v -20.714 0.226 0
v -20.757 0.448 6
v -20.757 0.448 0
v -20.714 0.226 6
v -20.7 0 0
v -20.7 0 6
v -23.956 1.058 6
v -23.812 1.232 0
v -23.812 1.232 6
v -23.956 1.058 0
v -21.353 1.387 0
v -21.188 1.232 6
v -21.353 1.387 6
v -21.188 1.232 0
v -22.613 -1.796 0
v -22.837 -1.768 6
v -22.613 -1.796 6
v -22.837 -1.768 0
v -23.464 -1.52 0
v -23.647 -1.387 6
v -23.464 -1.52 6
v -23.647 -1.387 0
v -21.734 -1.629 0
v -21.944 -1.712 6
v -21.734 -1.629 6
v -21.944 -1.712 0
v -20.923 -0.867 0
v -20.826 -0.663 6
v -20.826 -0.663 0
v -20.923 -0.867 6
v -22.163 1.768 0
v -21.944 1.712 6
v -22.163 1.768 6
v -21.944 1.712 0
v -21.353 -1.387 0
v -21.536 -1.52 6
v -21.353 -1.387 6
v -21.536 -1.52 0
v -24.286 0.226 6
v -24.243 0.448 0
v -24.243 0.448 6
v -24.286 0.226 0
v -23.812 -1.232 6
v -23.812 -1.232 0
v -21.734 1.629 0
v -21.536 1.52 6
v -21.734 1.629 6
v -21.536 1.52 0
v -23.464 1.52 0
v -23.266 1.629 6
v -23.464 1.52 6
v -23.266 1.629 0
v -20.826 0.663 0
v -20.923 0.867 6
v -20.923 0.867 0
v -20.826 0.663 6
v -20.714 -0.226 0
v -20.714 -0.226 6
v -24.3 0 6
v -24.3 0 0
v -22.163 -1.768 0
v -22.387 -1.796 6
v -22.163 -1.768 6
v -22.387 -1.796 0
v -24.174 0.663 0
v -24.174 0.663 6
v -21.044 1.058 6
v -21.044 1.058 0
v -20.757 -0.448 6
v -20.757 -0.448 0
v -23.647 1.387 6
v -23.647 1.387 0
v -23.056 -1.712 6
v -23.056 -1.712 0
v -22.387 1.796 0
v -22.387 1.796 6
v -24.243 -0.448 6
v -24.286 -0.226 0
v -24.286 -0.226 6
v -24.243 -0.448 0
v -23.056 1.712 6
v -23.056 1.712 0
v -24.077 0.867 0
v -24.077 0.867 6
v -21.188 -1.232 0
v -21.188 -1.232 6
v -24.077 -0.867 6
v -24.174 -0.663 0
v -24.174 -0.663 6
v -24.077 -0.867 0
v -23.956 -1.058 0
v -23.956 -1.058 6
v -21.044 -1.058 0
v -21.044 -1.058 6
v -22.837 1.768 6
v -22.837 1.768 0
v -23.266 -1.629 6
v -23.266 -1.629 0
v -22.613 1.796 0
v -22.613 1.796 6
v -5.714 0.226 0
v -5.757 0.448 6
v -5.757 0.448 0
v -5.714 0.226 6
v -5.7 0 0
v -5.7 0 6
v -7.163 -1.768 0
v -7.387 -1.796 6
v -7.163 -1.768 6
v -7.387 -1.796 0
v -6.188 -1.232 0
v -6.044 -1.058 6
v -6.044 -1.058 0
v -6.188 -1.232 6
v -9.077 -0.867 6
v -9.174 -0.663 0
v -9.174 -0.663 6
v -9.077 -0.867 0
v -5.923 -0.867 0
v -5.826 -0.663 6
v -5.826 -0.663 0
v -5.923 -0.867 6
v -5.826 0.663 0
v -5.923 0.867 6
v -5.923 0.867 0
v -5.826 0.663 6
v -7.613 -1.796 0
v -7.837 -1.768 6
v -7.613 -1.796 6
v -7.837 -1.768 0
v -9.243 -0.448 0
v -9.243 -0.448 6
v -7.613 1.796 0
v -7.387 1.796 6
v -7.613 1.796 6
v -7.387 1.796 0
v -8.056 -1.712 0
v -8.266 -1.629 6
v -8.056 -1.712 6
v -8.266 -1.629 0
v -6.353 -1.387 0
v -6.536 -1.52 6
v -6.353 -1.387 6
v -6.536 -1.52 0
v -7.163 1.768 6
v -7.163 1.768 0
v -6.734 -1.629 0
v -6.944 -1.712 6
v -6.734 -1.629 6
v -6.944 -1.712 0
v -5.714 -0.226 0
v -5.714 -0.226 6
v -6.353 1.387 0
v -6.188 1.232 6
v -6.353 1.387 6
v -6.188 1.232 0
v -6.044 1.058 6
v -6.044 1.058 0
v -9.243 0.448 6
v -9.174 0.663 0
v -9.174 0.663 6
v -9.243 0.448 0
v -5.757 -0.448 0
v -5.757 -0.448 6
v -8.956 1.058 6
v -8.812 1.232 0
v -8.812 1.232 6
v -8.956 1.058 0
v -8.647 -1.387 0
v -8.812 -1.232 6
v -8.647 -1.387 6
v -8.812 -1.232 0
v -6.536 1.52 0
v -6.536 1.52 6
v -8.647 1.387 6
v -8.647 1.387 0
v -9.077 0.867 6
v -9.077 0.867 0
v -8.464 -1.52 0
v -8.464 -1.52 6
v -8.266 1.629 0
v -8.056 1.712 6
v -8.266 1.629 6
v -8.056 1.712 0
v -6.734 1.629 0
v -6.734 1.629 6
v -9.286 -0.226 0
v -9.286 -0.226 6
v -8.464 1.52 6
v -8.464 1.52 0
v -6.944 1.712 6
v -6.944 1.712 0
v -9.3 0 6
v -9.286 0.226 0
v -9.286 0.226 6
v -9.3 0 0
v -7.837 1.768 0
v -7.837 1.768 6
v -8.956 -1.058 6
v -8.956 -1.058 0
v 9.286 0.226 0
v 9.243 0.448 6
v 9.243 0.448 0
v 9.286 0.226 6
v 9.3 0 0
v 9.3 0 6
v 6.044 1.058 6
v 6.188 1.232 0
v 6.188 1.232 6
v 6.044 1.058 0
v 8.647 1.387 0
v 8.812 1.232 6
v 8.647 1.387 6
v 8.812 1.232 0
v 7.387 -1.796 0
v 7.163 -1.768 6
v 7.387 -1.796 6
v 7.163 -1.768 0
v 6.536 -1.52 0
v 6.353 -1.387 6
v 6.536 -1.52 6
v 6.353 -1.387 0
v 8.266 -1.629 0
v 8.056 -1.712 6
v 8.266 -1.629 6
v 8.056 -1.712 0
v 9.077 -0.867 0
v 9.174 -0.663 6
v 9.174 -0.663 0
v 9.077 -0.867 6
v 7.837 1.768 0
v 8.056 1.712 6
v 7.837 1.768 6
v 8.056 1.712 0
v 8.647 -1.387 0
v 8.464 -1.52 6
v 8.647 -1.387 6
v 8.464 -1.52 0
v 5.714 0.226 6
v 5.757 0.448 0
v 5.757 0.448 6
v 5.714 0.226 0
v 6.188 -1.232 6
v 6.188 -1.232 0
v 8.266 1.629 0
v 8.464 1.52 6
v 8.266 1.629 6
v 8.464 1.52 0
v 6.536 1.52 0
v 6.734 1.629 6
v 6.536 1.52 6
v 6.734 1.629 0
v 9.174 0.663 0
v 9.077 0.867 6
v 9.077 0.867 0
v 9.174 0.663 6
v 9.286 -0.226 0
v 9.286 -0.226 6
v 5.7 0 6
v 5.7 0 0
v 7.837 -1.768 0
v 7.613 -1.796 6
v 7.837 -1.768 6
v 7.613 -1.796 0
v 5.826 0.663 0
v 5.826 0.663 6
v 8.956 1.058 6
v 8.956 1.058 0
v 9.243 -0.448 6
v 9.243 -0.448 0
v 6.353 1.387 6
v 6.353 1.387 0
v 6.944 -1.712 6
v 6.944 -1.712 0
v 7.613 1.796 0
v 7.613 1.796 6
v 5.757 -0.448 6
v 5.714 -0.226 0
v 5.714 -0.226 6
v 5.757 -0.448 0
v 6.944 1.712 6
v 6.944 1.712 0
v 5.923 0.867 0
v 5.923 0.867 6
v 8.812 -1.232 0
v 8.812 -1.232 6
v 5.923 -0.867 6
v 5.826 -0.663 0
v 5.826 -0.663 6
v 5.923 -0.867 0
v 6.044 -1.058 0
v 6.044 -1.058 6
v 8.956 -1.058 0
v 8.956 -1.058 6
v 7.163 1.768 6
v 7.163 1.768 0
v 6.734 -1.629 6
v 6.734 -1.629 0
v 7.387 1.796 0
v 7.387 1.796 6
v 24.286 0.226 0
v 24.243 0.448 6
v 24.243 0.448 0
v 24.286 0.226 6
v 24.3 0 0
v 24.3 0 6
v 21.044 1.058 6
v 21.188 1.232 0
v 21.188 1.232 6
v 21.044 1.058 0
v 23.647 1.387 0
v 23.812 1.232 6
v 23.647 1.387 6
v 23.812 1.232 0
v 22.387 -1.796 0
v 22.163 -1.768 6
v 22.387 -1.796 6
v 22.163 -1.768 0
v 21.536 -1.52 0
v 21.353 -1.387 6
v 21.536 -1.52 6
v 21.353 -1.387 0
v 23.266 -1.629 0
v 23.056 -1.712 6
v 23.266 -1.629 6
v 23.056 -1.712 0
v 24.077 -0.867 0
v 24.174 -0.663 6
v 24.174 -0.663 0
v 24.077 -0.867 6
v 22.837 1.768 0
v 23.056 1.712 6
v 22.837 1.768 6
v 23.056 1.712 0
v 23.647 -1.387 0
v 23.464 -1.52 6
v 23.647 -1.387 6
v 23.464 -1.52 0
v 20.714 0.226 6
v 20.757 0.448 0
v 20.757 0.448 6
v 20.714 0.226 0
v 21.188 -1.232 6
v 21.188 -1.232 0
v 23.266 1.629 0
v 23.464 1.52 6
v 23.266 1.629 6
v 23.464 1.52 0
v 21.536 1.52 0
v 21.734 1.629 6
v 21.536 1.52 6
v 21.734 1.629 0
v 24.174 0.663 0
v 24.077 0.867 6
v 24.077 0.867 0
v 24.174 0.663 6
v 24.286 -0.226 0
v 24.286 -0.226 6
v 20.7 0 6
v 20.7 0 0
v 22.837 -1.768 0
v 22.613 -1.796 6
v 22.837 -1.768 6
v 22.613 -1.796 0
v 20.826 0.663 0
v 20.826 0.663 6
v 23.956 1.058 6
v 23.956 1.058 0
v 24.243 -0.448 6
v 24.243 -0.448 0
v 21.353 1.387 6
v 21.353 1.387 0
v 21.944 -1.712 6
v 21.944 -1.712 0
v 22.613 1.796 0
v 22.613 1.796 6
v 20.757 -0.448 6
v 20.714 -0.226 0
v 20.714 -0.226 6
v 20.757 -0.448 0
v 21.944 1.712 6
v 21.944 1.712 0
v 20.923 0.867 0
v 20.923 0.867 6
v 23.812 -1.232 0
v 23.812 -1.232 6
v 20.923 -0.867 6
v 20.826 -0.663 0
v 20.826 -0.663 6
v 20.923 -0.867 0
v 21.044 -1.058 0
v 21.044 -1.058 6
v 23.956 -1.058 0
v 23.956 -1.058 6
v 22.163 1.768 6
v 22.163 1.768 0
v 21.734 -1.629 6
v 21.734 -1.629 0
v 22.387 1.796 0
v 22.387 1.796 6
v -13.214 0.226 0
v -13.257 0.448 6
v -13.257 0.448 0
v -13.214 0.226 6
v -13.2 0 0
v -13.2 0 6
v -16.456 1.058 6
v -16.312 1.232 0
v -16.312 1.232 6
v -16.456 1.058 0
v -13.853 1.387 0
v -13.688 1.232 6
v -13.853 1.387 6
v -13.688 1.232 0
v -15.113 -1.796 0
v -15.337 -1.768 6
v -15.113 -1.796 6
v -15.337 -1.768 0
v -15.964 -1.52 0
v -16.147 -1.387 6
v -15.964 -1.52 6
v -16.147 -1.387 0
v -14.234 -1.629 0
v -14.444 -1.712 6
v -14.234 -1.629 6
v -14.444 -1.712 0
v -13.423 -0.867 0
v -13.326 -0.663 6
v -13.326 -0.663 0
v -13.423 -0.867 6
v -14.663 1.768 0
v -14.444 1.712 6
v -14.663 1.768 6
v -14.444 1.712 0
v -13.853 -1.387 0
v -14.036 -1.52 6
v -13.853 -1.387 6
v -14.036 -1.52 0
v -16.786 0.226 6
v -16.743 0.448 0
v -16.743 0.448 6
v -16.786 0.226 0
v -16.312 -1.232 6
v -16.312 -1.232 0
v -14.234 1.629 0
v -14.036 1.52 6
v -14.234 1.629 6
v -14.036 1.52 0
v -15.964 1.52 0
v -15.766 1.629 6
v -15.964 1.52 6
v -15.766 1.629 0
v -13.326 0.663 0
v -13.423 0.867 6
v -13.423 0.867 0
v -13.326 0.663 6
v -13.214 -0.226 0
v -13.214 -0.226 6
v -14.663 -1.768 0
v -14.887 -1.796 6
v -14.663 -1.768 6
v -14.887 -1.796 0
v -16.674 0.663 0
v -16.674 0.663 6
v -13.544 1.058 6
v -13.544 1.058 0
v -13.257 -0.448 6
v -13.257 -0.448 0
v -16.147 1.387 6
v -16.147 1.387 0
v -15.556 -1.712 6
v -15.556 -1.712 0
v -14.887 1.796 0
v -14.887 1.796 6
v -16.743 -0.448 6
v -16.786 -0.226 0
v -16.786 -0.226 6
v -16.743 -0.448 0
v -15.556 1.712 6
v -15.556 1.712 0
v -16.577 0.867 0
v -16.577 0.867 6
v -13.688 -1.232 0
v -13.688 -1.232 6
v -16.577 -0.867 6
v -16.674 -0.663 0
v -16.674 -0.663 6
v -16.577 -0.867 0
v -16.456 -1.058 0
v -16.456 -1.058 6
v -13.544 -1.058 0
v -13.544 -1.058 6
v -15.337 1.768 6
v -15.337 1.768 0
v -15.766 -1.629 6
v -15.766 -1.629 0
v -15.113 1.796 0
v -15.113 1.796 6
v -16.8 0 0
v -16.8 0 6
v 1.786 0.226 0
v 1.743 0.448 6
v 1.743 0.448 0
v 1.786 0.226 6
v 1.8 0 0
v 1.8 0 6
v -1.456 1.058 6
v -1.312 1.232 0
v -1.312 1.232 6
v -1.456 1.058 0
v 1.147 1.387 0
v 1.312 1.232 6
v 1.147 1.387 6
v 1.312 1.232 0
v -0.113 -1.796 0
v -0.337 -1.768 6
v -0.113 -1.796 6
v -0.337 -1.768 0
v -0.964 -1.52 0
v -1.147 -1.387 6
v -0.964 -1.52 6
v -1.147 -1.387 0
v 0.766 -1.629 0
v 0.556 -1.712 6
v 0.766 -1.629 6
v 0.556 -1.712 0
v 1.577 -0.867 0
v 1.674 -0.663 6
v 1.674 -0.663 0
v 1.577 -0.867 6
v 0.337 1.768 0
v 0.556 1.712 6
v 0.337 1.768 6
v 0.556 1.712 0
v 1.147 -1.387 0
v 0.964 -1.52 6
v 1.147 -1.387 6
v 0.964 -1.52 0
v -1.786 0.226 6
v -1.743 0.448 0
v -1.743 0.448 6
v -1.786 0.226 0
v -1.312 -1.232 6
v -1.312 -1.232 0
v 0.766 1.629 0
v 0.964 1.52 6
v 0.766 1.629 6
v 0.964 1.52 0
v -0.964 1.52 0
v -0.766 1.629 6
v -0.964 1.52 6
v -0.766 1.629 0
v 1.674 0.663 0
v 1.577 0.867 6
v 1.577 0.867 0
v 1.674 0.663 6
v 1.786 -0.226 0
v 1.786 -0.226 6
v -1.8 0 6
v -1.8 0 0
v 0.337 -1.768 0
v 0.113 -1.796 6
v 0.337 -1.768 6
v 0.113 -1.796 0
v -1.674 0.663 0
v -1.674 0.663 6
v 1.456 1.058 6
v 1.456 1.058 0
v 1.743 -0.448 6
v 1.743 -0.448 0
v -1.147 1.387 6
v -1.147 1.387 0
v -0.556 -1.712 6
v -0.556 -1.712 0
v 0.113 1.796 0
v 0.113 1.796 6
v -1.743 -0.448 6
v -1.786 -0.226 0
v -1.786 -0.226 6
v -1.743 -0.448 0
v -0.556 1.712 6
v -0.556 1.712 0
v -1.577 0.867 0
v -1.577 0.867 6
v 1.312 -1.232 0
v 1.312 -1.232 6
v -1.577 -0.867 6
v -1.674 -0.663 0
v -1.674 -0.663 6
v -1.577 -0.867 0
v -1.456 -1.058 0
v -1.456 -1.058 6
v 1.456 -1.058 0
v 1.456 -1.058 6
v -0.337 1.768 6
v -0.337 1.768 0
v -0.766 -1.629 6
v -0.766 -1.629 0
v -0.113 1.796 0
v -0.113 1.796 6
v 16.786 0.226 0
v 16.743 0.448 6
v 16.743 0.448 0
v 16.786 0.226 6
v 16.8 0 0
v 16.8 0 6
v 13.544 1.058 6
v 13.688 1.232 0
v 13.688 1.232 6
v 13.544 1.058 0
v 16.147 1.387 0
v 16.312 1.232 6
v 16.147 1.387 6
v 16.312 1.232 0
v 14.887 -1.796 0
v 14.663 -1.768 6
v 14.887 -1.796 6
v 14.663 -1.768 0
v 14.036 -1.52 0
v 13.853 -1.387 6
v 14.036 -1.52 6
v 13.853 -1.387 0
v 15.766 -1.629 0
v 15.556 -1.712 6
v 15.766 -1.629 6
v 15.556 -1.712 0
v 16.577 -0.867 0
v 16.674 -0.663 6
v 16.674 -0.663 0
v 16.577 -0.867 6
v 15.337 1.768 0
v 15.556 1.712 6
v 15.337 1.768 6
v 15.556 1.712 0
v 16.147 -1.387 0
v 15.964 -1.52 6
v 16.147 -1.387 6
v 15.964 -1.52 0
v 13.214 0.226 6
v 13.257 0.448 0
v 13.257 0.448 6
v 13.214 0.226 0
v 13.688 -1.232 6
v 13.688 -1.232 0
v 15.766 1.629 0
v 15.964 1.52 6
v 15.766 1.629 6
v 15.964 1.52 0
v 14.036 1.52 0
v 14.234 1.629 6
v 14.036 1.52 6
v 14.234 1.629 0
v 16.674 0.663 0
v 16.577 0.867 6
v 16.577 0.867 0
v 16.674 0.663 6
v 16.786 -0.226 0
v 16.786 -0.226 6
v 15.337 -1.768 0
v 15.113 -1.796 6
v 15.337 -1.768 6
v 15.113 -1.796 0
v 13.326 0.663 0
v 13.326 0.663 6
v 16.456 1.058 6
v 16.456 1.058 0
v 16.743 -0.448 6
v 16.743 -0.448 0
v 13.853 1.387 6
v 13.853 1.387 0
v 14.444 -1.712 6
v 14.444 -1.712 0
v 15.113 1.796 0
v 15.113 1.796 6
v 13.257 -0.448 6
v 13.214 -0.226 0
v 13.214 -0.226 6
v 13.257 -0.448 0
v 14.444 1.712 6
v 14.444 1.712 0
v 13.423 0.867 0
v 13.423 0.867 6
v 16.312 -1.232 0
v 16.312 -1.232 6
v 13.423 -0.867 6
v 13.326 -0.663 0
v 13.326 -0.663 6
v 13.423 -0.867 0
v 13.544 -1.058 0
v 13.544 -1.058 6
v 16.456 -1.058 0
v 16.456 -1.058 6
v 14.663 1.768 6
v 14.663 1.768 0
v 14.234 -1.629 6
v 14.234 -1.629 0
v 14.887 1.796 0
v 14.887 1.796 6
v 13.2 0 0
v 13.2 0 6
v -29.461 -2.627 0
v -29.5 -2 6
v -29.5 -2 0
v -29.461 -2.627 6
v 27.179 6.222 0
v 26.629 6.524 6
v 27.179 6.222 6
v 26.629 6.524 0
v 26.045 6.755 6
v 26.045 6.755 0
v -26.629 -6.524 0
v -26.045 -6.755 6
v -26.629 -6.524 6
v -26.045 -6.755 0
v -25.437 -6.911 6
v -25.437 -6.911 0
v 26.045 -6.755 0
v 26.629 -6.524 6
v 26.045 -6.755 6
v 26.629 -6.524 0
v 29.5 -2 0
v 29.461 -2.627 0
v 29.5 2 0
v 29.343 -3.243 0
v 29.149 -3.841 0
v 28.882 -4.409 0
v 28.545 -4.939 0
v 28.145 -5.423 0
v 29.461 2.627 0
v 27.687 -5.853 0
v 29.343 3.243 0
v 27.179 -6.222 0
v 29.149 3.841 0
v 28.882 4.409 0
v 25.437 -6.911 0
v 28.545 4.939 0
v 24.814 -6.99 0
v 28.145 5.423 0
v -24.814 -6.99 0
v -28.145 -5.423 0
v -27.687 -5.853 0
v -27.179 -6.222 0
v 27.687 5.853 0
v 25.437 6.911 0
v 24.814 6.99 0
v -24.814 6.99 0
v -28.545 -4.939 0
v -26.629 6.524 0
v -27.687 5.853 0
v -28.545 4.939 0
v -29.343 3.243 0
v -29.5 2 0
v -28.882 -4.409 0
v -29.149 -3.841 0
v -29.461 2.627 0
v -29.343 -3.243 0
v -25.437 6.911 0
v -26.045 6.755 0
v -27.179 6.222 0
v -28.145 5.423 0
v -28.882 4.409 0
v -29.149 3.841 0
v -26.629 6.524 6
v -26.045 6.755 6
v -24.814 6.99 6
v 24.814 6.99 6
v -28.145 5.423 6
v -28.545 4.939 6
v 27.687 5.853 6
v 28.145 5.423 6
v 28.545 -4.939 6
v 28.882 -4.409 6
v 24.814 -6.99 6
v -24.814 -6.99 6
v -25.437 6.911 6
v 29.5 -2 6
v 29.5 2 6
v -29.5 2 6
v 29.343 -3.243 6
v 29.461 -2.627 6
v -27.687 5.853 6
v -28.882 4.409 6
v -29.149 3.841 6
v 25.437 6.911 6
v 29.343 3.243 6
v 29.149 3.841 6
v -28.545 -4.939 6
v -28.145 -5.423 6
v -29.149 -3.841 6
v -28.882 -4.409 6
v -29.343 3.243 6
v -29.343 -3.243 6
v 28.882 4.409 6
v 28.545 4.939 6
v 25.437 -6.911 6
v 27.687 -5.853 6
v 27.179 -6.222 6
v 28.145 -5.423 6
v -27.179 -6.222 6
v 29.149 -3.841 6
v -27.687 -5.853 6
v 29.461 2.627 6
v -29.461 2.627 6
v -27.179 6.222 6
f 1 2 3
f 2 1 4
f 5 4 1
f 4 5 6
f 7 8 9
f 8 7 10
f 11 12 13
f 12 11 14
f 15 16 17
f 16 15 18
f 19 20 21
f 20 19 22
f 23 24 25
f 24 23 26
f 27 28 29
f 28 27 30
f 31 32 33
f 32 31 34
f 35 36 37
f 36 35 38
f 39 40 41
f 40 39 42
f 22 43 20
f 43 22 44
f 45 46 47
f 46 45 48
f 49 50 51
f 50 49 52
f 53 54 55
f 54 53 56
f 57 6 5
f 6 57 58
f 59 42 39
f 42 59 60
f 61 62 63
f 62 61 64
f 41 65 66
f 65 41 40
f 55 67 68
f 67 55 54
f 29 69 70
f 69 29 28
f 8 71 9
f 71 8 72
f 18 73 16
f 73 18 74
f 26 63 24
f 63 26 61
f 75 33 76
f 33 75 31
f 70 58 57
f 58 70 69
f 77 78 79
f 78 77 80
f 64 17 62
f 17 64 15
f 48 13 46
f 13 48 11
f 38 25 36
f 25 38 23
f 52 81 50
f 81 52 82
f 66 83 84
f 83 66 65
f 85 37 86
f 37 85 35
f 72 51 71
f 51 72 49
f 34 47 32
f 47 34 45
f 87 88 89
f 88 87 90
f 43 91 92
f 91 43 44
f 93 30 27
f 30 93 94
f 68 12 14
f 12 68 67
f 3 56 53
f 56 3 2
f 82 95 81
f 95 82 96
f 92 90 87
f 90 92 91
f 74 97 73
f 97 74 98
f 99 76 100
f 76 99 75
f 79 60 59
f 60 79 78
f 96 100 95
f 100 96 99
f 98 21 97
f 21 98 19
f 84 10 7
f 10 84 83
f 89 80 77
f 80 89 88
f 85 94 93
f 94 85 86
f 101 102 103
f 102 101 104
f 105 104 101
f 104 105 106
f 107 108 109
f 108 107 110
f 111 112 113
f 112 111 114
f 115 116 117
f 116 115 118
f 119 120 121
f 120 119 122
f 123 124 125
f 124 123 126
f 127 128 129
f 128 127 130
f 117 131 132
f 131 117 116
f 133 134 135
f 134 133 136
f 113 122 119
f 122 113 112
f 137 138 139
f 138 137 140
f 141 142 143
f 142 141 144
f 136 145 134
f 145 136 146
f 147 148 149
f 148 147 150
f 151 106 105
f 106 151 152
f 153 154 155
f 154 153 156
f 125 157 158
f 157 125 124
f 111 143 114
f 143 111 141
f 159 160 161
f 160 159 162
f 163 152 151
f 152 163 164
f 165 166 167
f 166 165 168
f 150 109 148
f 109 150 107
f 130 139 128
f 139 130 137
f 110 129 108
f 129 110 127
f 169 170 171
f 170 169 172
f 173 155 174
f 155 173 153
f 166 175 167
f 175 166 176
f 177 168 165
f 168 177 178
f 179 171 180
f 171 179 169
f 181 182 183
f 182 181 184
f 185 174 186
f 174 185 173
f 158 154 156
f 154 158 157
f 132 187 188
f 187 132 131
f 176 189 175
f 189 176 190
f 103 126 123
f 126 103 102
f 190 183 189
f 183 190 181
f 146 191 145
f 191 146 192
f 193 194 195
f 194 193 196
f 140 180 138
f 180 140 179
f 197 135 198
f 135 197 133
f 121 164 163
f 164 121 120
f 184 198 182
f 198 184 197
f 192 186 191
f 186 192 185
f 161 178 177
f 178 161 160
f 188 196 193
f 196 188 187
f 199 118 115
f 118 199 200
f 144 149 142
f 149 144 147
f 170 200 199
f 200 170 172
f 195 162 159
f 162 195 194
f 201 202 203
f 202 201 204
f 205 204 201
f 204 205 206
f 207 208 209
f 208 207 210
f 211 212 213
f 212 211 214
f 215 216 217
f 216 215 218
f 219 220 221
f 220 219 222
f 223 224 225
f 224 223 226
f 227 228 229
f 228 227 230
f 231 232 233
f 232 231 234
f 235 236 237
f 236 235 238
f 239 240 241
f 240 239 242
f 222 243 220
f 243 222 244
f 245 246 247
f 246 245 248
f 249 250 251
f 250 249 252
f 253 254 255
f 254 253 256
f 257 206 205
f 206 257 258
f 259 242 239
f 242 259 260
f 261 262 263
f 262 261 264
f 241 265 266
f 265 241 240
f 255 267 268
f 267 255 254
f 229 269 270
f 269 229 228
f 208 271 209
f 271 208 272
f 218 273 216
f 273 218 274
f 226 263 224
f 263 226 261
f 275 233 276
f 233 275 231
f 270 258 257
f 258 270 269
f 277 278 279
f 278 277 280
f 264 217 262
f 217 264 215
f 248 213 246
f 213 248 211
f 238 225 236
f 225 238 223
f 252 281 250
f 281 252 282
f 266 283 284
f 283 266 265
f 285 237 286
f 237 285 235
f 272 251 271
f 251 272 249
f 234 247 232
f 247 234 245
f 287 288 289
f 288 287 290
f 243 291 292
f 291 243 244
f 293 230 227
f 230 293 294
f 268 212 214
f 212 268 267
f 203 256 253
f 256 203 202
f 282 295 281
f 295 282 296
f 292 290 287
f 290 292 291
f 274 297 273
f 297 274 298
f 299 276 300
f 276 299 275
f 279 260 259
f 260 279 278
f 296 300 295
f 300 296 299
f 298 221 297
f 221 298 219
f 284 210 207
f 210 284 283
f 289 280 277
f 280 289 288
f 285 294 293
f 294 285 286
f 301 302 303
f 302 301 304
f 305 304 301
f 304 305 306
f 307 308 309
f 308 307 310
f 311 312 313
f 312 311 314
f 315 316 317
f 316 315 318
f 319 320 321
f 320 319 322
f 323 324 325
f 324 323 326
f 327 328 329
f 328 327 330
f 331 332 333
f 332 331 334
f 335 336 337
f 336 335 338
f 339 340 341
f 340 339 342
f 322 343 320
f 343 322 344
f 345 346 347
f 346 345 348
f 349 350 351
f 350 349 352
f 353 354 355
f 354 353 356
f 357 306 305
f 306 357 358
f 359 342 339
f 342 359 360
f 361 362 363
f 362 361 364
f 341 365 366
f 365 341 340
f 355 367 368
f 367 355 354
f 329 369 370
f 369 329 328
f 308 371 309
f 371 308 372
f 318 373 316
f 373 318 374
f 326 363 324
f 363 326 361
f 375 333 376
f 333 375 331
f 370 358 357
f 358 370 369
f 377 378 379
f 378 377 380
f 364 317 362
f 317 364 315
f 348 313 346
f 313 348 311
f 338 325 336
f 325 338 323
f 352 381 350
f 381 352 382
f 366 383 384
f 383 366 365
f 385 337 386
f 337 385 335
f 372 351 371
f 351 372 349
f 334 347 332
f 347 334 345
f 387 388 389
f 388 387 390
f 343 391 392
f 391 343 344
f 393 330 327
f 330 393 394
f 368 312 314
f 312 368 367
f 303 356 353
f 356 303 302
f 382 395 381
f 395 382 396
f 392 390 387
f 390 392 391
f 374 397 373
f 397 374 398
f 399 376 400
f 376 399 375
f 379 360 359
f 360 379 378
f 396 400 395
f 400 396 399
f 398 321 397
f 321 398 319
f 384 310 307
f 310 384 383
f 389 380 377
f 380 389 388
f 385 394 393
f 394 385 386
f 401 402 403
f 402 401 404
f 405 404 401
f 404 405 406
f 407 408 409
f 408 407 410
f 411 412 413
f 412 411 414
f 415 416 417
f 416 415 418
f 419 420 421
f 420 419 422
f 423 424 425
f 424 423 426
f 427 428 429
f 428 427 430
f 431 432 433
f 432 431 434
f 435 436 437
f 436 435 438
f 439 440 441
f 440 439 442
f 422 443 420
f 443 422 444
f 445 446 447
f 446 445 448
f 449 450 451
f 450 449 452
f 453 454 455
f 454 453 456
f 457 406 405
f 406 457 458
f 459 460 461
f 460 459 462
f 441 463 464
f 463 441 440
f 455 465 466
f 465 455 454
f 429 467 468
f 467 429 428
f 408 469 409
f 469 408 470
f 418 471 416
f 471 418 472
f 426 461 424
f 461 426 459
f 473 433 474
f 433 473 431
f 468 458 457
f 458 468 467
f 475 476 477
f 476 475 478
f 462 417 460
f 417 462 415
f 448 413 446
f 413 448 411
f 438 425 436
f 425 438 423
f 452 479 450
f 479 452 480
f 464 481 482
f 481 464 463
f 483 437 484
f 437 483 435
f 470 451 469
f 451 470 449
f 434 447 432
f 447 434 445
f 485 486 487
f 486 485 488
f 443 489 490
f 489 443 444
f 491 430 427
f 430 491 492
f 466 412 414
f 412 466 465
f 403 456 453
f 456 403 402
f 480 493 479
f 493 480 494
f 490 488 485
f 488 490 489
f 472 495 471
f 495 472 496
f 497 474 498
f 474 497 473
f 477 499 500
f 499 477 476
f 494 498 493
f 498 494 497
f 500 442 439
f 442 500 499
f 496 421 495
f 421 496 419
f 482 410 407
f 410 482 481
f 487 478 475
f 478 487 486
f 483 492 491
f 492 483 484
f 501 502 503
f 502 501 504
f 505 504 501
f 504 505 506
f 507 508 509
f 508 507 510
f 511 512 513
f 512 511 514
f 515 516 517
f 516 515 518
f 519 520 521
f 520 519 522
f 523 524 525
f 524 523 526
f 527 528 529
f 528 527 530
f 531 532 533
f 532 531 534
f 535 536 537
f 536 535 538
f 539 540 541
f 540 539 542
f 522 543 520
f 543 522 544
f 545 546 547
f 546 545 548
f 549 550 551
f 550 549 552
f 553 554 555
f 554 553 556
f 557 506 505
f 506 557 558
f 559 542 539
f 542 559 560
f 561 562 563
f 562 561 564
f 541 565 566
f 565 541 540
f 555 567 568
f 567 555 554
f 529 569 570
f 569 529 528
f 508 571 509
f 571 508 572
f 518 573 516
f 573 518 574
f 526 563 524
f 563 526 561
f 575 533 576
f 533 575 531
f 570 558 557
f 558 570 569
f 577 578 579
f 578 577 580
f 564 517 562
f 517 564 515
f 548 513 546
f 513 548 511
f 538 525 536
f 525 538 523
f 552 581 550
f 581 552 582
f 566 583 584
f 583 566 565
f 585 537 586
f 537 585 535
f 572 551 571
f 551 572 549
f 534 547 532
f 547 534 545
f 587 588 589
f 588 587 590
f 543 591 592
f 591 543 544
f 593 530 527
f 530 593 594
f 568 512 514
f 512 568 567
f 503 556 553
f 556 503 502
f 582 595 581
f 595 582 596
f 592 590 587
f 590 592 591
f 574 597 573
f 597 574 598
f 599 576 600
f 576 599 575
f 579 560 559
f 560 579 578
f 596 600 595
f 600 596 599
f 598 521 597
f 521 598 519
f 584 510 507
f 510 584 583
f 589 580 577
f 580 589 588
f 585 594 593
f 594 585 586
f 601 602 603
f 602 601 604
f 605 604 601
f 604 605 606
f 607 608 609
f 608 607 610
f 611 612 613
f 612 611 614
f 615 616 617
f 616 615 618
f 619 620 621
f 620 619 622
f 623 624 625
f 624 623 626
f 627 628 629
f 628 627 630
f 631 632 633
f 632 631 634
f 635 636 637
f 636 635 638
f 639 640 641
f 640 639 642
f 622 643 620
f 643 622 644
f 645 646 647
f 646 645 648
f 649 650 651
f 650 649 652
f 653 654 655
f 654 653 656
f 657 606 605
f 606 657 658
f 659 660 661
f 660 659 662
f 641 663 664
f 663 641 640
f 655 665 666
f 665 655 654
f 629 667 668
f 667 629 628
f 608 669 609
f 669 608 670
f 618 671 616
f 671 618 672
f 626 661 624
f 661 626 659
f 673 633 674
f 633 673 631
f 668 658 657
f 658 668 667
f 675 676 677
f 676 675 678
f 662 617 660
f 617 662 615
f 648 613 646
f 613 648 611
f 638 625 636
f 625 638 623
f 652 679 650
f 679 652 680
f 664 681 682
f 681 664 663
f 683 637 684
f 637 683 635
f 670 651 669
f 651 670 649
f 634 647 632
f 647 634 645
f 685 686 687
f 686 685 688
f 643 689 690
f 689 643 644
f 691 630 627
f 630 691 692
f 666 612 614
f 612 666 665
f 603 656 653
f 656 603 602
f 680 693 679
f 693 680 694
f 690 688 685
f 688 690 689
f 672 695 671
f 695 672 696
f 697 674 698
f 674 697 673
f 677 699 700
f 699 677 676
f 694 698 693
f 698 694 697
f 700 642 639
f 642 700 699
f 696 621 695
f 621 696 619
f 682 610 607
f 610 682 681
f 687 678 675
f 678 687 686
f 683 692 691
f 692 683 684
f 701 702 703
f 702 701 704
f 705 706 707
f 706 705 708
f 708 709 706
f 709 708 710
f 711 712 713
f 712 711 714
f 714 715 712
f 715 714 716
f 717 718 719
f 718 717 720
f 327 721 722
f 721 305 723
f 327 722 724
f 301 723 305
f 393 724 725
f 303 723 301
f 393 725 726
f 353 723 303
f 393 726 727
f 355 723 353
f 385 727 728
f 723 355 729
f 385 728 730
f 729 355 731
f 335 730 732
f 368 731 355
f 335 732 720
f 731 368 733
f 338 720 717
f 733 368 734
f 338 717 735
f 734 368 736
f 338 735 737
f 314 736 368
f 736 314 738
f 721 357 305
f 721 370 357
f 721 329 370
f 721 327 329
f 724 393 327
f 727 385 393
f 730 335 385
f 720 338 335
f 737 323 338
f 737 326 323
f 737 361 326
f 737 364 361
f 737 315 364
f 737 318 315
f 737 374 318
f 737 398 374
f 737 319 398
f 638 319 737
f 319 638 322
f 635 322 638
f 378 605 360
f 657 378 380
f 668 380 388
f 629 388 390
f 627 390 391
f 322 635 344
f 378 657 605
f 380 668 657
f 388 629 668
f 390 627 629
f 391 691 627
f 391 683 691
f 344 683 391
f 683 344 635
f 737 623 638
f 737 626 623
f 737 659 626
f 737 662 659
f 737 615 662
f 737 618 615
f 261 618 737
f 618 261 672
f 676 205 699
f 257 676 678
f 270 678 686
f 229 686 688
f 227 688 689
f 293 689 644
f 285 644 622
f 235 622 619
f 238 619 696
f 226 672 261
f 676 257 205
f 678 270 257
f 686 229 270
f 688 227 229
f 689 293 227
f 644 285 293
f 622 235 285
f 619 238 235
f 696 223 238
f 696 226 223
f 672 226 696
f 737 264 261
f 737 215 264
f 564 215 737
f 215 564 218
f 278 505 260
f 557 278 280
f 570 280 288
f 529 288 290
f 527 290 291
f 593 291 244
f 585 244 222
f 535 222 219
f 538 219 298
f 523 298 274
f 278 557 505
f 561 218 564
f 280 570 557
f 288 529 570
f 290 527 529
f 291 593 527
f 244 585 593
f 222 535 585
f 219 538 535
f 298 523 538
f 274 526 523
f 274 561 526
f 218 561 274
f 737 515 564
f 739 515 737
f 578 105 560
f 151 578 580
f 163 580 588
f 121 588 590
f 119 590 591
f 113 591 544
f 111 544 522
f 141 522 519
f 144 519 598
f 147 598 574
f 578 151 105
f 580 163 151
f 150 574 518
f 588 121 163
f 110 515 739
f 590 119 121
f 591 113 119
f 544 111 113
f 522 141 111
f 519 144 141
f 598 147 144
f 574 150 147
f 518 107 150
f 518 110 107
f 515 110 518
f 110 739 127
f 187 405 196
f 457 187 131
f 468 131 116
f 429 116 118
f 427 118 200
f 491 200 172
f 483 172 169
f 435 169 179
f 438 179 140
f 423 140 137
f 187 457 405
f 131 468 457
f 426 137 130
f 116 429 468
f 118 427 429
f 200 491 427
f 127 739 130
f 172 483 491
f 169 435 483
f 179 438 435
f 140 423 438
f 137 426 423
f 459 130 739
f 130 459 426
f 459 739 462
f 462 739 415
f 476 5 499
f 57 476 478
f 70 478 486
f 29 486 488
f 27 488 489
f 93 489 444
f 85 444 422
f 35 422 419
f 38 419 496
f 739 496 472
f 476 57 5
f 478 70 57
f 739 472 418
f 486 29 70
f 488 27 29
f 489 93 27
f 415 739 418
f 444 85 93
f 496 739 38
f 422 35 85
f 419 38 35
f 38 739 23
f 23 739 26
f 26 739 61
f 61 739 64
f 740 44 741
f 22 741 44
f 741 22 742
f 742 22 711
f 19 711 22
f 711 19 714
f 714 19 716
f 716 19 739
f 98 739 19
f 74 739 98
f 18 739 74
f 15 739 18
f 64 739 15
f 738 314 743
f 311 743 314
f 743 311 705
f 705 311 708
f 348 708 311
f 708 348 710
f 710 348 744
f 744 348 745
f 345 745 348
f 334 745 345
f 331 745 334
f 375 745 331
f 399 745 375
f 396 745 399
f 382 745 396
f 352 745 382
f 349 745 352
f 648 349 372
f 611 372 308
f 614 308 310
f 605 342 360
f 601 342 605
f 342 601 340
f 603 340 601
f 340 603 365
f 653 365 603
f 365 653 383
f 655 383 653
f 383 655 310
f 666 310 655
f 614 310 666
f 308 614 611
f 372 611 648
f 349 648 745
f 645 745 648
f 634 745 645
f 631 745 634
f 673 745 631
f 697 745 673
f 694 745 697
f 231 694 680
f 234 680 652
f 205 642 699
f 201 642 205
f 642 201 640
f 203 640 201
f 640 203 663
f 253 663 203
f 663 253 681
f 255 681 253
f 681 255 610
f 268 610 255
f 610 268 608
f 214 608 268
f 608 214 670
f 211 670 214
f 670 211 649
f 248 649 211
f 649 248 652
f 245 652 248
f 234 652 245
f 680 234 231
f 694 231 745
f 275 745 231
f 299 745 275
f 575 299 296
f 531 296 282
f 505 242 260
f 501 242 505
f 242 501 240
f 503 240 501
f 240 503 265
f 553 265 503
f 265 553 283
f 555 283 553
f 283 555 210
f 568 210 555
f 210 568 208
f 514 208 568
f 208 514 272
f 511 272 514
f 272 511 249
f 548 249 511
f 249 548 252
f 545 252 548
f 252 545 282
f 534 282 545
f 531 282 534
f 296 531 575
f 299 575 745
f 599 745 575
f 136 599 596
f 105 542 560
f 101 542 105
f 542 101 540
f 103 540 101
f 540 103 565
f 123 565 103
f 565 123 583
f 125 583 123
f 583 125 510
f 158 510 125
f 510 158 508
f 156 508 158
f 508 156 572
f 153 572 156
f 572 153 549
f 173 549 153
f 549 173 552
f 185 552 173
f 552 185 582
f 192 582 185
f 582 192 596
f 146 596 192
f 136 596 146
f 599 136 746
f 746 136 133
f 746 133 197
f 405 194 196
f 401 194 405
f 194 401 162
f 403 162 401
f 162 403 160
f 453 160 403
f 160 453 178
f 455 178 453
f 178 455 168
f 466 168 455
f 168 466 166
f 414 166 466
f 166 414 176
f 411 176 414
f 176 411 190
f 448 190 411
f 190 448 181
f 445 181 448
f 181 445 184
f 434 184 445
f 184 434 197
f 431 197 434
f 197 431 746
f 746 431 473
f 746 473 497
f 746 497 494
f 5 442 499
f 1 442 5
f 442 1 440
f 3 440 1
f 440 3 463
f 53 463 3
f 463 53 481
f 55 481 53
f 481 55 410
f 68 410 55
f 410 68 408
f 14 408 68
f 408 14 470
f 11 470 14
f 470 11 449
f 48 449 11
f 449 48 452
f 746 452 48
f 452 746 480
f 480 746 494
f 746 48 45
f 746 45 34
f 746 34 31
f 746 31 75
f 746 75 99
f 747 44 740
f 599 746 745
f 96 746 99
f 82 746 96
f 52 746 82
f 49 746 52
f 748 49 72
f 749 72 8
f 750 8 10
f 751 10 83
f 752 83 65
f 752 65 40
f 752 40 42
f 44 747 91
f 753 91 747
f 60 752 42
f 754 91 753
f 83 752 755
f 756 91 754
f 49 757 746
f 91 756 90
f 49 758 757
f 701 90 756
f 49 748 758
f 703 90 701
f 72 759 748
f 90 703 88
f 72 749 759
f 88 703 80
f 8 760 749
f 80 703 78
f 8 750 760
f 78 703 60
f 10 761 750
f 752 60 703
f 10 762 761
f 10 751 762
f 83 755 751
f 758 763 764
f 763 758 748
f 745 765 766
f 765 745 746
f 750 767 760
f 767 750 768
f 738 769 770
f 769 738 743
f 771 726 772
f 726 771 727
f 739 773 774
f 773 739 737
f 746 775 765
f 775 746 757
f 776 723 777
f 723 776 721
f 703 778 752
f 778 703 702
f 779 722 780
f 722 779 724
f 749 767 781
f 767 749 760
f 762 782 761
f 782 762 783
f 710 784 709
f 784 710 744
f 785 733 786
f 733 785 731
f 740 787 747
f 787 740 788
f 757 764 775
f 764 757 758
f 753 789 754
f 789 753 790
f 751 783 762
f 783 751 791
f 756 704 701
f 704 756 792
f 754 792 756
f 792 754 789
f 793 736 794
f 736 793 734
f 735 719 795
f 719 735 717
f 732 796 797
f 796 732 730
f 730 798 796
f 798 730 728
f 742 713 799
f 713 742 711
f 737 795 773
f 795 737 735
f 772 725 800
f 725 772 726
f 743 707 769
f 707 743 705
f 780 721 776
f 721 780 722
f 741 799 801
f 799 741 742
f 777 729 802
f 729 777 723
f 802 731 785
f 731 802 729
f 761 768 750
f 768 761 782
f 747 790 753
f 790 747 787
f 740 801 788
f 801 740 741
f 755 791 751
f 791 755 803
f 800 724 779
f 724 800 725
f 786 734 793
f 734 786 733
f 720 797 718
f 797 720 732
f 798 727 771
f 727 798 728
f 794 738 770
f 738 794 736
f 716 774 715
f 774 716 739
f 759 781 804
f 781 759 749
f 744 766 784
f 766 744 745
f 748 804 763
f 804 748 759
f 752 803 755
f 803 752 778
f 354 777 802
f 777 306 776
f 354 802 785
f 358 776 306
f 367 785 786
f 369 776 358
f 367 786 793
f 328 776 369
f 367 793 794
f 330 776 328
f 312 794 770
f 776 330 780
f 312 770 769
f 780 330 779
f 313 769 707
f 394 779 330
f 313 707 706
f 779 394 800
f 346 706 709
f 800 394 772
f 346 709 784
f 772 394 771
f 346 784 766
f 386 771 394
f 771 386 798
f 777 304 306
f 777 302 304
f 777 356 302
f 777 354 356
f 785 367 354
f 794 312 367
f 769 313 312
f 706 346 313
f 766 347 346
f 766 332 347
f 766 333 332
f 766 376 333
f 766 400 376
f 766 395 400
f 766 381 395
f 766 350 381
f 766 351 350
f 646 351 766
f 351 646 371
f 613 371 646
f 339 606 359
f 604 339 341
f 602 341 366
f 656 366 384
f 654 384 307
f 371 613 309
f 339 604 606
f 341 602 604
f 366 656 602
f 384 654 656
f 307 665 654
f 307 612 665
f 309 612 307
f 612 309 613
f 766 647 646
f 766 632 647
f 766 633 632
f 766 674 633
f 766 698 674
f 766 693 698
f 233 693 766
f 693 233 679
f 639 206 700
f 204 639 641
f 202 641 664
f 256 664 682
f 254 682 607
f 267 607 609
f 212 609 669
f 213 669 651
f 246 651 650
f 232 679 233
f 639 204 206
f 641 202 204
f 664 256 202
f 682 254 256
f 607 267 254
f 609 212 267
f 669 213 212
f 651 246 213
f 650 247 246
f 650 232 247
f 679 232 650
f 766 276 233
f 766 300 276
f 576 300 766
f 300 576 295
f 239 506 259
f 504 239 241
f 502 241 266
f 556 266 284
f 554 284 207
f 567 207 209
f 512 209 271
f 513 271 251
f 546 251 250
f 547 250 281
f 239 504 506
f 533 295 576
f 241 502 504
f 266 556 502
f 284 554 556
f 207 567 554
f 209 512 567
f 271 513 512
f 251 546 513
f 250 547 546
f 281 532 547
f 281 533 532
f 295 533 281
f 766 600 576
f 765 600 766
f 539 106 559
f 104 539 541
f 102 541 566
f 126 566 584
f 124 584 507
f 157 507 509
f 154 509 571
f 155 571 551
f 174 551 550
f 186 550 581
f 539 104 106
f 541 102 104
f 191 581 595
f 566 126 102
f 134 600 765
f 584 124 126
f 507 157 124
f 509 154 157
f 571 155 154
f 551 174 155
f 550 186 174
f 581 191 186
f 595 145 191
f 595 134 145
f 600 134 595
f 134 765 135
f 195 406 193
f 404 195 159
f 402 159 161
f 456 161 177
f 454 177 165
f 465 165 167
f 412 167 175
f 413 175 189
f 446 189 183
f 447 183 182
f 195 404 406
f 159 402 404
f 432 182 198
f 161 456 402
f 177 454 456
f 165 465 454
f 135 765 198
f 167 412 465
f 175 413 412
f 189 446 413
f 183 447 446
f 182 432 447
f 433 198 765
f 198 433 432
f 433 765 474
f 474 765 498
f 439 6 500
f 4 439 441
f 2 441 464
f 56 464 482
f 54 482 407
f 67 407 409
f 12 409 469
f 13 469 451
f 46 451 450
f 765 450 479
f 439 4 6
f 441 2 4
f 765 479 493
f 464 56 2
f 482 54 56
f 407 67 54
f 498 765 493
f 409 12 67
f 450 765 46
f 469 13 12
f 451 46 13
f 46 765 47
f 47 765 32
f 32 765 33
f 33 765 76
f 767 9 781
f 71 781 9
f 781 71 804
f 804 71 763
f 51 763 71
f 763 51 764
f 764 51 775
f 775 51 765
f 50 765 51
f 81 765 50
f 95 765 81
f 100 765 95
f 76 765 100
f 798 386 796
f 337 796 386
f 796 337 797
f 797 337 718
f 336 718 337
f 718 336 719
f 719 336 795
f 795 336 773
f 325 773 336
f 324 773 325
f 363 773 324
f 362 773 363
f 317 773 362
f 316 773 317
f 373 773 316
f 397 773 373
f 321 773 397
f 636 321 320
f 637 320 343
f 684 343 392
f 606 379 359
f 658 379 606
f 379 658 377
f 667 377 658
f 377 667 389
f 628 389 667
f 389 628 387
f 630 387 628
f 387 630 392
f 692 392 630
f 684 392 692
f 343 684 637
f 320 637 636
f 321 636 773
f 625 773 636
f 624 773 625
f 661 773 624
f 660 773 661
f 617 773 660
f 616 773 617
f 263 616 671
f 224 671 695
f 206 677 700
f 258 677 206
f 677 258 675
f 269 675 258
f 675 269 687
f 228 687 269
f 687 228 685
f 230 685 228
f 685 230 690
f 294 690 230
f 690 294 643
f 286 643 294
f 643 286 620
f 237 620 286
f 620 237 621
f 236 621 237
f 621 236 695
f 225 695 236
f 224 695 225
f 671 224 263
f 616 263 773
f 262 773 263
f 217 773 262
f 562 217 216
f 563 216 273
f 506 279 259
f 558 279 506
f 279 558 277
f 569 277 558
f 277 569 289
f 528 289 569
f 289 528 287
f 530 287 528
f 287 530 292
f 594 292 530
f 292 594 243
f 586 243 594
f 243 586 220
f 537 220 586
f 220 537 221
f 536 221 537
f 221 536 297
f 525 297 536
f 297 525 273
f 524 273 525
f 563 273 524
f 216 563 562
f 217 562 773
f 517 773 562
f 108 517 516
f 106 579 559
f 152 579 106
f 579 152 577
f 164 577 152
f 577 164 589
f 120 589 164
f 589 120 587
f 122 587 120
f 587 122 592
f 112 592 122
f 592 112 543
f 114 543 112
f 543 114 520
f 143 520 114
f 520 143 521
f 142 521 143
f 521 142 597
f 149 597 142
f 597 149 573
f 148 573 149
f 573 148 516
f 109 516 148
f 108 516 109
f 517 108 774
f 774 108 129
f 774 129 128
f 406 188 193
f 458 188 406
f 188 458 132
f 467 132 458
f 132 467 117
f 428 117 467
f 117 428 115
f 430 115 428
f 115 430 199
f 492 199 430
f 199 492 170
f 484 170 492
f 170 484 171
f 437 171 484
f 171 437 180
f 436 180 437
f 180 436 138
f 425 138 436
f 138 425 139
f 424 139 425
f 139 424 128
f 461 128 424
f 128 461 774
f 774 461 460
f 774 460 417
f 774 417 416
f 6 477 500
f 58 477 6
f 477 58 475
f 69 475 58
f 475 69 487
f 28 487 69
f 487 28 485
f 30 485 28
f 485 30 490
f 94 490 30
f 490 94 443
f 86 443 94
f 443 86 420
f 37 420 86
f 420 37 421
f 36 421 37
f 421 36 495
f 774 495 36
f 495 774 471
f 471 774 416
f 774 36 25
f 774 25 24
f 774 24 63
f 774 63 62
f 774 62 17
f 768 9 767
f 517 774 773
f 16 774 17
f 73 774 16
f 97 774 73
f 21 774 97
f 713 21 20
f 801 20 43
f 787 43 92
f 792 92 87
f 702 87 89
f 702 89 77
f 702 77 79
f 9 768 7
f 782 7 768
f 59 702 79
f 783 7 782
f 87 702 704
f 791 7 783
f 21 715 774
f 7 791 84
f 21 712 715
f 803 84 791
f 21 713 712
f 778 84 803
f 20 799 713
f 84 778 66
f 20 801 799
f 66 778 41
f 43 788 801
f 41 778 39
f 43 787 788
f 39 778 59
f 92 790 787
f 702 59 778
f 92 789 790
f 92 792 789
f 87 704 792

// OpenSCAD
$fn = 50;


difference() {
	union() {
		hull() {
			translate(v = [-24.5000000000, 2.0000000000, 0]) {
				cylinder(h = 6, r = 5);
			}
			translate(v = [24.5000000000, 2.0000000000, 0]) {
				cylinder(h = 6, r = 5);
			}
			translate(v = [-24.5000000000, -2.0000000000, 0]) {
				cylinder(h = 6, r = 5);
			}
			translate(v = [24.5000000000, -2.0000000000, 0]) {
				cylinder(h = 6, r = 5);
			}
		}
	}
	union() {
		translate(v = [-22.5000000000, 0.0000000000, 0]) {
			translate(v = [0, 0, -100]) {
				cylinder(h = 200, r = 1.8000000000);
			}
		}
		translate(v = [-7.5000000000, 0.0000000000, 0]) {
			translate(v = [0, 0, -100]) {
				cylinder(h = 200, r = 1.8000000000);
			}
		}
		translate(v = [7.5000000000, 0.0000000000, 0]) {
			translate(v = [0, 0, -100]) {
				cylinder(h = 200, r = 1.8000000000);
			}
		}
		translate(v = [22.5000000000, 0.0000000000, 0]) {
			translate(v = [0, 0, -100]) {
				cylinder(h = 200, r = 1.8000000000);
			}
		}
		translate(v = [-22.5000000000, 0.0000000000, 0]) {
			translate(v = [0, 0, -100]) {
				cylinder(h = 200, r = 1.8000000000);
			}
		}
		translate(v = [-15.0000000000, 0.0000000000, 0]) {
			translate(v = [0, 0, -100]) {
				cylinder(h = 200, r = 1.8000000000);
			}
		}
		translate(v = [-7.5000000000, 0.0000000000, 0]) {
			translate(v = [0, 0, -100]) {
				cylinder(h = 200, r = 1.8000000000);
			}
		}
		translate(v = [0, 0, -100]) {
			cylinder(h = 200, r = 1.8000000000);
		}
		translate(v = [7.5000000000, 0.0000000000, 0]) {
			translate(v = [0, 0, -100]) {
				cylinder(h = 200, r = 1.8000000000);
			}
		}
		translate(v = [15.0000000000, 0.0000000000, 0]) {
			translate(v = [0, 0, -100]) {
				cylinder(h = 200, r = 1.8000000000);
			}
		}
		translate(v = [22.5000000000, 0.0000000000, 0]) {
			translate(v = [0, 0, -100]) {
				cylinder(h = 200, r = 1.8000000000);
			}
		}
	}
}
